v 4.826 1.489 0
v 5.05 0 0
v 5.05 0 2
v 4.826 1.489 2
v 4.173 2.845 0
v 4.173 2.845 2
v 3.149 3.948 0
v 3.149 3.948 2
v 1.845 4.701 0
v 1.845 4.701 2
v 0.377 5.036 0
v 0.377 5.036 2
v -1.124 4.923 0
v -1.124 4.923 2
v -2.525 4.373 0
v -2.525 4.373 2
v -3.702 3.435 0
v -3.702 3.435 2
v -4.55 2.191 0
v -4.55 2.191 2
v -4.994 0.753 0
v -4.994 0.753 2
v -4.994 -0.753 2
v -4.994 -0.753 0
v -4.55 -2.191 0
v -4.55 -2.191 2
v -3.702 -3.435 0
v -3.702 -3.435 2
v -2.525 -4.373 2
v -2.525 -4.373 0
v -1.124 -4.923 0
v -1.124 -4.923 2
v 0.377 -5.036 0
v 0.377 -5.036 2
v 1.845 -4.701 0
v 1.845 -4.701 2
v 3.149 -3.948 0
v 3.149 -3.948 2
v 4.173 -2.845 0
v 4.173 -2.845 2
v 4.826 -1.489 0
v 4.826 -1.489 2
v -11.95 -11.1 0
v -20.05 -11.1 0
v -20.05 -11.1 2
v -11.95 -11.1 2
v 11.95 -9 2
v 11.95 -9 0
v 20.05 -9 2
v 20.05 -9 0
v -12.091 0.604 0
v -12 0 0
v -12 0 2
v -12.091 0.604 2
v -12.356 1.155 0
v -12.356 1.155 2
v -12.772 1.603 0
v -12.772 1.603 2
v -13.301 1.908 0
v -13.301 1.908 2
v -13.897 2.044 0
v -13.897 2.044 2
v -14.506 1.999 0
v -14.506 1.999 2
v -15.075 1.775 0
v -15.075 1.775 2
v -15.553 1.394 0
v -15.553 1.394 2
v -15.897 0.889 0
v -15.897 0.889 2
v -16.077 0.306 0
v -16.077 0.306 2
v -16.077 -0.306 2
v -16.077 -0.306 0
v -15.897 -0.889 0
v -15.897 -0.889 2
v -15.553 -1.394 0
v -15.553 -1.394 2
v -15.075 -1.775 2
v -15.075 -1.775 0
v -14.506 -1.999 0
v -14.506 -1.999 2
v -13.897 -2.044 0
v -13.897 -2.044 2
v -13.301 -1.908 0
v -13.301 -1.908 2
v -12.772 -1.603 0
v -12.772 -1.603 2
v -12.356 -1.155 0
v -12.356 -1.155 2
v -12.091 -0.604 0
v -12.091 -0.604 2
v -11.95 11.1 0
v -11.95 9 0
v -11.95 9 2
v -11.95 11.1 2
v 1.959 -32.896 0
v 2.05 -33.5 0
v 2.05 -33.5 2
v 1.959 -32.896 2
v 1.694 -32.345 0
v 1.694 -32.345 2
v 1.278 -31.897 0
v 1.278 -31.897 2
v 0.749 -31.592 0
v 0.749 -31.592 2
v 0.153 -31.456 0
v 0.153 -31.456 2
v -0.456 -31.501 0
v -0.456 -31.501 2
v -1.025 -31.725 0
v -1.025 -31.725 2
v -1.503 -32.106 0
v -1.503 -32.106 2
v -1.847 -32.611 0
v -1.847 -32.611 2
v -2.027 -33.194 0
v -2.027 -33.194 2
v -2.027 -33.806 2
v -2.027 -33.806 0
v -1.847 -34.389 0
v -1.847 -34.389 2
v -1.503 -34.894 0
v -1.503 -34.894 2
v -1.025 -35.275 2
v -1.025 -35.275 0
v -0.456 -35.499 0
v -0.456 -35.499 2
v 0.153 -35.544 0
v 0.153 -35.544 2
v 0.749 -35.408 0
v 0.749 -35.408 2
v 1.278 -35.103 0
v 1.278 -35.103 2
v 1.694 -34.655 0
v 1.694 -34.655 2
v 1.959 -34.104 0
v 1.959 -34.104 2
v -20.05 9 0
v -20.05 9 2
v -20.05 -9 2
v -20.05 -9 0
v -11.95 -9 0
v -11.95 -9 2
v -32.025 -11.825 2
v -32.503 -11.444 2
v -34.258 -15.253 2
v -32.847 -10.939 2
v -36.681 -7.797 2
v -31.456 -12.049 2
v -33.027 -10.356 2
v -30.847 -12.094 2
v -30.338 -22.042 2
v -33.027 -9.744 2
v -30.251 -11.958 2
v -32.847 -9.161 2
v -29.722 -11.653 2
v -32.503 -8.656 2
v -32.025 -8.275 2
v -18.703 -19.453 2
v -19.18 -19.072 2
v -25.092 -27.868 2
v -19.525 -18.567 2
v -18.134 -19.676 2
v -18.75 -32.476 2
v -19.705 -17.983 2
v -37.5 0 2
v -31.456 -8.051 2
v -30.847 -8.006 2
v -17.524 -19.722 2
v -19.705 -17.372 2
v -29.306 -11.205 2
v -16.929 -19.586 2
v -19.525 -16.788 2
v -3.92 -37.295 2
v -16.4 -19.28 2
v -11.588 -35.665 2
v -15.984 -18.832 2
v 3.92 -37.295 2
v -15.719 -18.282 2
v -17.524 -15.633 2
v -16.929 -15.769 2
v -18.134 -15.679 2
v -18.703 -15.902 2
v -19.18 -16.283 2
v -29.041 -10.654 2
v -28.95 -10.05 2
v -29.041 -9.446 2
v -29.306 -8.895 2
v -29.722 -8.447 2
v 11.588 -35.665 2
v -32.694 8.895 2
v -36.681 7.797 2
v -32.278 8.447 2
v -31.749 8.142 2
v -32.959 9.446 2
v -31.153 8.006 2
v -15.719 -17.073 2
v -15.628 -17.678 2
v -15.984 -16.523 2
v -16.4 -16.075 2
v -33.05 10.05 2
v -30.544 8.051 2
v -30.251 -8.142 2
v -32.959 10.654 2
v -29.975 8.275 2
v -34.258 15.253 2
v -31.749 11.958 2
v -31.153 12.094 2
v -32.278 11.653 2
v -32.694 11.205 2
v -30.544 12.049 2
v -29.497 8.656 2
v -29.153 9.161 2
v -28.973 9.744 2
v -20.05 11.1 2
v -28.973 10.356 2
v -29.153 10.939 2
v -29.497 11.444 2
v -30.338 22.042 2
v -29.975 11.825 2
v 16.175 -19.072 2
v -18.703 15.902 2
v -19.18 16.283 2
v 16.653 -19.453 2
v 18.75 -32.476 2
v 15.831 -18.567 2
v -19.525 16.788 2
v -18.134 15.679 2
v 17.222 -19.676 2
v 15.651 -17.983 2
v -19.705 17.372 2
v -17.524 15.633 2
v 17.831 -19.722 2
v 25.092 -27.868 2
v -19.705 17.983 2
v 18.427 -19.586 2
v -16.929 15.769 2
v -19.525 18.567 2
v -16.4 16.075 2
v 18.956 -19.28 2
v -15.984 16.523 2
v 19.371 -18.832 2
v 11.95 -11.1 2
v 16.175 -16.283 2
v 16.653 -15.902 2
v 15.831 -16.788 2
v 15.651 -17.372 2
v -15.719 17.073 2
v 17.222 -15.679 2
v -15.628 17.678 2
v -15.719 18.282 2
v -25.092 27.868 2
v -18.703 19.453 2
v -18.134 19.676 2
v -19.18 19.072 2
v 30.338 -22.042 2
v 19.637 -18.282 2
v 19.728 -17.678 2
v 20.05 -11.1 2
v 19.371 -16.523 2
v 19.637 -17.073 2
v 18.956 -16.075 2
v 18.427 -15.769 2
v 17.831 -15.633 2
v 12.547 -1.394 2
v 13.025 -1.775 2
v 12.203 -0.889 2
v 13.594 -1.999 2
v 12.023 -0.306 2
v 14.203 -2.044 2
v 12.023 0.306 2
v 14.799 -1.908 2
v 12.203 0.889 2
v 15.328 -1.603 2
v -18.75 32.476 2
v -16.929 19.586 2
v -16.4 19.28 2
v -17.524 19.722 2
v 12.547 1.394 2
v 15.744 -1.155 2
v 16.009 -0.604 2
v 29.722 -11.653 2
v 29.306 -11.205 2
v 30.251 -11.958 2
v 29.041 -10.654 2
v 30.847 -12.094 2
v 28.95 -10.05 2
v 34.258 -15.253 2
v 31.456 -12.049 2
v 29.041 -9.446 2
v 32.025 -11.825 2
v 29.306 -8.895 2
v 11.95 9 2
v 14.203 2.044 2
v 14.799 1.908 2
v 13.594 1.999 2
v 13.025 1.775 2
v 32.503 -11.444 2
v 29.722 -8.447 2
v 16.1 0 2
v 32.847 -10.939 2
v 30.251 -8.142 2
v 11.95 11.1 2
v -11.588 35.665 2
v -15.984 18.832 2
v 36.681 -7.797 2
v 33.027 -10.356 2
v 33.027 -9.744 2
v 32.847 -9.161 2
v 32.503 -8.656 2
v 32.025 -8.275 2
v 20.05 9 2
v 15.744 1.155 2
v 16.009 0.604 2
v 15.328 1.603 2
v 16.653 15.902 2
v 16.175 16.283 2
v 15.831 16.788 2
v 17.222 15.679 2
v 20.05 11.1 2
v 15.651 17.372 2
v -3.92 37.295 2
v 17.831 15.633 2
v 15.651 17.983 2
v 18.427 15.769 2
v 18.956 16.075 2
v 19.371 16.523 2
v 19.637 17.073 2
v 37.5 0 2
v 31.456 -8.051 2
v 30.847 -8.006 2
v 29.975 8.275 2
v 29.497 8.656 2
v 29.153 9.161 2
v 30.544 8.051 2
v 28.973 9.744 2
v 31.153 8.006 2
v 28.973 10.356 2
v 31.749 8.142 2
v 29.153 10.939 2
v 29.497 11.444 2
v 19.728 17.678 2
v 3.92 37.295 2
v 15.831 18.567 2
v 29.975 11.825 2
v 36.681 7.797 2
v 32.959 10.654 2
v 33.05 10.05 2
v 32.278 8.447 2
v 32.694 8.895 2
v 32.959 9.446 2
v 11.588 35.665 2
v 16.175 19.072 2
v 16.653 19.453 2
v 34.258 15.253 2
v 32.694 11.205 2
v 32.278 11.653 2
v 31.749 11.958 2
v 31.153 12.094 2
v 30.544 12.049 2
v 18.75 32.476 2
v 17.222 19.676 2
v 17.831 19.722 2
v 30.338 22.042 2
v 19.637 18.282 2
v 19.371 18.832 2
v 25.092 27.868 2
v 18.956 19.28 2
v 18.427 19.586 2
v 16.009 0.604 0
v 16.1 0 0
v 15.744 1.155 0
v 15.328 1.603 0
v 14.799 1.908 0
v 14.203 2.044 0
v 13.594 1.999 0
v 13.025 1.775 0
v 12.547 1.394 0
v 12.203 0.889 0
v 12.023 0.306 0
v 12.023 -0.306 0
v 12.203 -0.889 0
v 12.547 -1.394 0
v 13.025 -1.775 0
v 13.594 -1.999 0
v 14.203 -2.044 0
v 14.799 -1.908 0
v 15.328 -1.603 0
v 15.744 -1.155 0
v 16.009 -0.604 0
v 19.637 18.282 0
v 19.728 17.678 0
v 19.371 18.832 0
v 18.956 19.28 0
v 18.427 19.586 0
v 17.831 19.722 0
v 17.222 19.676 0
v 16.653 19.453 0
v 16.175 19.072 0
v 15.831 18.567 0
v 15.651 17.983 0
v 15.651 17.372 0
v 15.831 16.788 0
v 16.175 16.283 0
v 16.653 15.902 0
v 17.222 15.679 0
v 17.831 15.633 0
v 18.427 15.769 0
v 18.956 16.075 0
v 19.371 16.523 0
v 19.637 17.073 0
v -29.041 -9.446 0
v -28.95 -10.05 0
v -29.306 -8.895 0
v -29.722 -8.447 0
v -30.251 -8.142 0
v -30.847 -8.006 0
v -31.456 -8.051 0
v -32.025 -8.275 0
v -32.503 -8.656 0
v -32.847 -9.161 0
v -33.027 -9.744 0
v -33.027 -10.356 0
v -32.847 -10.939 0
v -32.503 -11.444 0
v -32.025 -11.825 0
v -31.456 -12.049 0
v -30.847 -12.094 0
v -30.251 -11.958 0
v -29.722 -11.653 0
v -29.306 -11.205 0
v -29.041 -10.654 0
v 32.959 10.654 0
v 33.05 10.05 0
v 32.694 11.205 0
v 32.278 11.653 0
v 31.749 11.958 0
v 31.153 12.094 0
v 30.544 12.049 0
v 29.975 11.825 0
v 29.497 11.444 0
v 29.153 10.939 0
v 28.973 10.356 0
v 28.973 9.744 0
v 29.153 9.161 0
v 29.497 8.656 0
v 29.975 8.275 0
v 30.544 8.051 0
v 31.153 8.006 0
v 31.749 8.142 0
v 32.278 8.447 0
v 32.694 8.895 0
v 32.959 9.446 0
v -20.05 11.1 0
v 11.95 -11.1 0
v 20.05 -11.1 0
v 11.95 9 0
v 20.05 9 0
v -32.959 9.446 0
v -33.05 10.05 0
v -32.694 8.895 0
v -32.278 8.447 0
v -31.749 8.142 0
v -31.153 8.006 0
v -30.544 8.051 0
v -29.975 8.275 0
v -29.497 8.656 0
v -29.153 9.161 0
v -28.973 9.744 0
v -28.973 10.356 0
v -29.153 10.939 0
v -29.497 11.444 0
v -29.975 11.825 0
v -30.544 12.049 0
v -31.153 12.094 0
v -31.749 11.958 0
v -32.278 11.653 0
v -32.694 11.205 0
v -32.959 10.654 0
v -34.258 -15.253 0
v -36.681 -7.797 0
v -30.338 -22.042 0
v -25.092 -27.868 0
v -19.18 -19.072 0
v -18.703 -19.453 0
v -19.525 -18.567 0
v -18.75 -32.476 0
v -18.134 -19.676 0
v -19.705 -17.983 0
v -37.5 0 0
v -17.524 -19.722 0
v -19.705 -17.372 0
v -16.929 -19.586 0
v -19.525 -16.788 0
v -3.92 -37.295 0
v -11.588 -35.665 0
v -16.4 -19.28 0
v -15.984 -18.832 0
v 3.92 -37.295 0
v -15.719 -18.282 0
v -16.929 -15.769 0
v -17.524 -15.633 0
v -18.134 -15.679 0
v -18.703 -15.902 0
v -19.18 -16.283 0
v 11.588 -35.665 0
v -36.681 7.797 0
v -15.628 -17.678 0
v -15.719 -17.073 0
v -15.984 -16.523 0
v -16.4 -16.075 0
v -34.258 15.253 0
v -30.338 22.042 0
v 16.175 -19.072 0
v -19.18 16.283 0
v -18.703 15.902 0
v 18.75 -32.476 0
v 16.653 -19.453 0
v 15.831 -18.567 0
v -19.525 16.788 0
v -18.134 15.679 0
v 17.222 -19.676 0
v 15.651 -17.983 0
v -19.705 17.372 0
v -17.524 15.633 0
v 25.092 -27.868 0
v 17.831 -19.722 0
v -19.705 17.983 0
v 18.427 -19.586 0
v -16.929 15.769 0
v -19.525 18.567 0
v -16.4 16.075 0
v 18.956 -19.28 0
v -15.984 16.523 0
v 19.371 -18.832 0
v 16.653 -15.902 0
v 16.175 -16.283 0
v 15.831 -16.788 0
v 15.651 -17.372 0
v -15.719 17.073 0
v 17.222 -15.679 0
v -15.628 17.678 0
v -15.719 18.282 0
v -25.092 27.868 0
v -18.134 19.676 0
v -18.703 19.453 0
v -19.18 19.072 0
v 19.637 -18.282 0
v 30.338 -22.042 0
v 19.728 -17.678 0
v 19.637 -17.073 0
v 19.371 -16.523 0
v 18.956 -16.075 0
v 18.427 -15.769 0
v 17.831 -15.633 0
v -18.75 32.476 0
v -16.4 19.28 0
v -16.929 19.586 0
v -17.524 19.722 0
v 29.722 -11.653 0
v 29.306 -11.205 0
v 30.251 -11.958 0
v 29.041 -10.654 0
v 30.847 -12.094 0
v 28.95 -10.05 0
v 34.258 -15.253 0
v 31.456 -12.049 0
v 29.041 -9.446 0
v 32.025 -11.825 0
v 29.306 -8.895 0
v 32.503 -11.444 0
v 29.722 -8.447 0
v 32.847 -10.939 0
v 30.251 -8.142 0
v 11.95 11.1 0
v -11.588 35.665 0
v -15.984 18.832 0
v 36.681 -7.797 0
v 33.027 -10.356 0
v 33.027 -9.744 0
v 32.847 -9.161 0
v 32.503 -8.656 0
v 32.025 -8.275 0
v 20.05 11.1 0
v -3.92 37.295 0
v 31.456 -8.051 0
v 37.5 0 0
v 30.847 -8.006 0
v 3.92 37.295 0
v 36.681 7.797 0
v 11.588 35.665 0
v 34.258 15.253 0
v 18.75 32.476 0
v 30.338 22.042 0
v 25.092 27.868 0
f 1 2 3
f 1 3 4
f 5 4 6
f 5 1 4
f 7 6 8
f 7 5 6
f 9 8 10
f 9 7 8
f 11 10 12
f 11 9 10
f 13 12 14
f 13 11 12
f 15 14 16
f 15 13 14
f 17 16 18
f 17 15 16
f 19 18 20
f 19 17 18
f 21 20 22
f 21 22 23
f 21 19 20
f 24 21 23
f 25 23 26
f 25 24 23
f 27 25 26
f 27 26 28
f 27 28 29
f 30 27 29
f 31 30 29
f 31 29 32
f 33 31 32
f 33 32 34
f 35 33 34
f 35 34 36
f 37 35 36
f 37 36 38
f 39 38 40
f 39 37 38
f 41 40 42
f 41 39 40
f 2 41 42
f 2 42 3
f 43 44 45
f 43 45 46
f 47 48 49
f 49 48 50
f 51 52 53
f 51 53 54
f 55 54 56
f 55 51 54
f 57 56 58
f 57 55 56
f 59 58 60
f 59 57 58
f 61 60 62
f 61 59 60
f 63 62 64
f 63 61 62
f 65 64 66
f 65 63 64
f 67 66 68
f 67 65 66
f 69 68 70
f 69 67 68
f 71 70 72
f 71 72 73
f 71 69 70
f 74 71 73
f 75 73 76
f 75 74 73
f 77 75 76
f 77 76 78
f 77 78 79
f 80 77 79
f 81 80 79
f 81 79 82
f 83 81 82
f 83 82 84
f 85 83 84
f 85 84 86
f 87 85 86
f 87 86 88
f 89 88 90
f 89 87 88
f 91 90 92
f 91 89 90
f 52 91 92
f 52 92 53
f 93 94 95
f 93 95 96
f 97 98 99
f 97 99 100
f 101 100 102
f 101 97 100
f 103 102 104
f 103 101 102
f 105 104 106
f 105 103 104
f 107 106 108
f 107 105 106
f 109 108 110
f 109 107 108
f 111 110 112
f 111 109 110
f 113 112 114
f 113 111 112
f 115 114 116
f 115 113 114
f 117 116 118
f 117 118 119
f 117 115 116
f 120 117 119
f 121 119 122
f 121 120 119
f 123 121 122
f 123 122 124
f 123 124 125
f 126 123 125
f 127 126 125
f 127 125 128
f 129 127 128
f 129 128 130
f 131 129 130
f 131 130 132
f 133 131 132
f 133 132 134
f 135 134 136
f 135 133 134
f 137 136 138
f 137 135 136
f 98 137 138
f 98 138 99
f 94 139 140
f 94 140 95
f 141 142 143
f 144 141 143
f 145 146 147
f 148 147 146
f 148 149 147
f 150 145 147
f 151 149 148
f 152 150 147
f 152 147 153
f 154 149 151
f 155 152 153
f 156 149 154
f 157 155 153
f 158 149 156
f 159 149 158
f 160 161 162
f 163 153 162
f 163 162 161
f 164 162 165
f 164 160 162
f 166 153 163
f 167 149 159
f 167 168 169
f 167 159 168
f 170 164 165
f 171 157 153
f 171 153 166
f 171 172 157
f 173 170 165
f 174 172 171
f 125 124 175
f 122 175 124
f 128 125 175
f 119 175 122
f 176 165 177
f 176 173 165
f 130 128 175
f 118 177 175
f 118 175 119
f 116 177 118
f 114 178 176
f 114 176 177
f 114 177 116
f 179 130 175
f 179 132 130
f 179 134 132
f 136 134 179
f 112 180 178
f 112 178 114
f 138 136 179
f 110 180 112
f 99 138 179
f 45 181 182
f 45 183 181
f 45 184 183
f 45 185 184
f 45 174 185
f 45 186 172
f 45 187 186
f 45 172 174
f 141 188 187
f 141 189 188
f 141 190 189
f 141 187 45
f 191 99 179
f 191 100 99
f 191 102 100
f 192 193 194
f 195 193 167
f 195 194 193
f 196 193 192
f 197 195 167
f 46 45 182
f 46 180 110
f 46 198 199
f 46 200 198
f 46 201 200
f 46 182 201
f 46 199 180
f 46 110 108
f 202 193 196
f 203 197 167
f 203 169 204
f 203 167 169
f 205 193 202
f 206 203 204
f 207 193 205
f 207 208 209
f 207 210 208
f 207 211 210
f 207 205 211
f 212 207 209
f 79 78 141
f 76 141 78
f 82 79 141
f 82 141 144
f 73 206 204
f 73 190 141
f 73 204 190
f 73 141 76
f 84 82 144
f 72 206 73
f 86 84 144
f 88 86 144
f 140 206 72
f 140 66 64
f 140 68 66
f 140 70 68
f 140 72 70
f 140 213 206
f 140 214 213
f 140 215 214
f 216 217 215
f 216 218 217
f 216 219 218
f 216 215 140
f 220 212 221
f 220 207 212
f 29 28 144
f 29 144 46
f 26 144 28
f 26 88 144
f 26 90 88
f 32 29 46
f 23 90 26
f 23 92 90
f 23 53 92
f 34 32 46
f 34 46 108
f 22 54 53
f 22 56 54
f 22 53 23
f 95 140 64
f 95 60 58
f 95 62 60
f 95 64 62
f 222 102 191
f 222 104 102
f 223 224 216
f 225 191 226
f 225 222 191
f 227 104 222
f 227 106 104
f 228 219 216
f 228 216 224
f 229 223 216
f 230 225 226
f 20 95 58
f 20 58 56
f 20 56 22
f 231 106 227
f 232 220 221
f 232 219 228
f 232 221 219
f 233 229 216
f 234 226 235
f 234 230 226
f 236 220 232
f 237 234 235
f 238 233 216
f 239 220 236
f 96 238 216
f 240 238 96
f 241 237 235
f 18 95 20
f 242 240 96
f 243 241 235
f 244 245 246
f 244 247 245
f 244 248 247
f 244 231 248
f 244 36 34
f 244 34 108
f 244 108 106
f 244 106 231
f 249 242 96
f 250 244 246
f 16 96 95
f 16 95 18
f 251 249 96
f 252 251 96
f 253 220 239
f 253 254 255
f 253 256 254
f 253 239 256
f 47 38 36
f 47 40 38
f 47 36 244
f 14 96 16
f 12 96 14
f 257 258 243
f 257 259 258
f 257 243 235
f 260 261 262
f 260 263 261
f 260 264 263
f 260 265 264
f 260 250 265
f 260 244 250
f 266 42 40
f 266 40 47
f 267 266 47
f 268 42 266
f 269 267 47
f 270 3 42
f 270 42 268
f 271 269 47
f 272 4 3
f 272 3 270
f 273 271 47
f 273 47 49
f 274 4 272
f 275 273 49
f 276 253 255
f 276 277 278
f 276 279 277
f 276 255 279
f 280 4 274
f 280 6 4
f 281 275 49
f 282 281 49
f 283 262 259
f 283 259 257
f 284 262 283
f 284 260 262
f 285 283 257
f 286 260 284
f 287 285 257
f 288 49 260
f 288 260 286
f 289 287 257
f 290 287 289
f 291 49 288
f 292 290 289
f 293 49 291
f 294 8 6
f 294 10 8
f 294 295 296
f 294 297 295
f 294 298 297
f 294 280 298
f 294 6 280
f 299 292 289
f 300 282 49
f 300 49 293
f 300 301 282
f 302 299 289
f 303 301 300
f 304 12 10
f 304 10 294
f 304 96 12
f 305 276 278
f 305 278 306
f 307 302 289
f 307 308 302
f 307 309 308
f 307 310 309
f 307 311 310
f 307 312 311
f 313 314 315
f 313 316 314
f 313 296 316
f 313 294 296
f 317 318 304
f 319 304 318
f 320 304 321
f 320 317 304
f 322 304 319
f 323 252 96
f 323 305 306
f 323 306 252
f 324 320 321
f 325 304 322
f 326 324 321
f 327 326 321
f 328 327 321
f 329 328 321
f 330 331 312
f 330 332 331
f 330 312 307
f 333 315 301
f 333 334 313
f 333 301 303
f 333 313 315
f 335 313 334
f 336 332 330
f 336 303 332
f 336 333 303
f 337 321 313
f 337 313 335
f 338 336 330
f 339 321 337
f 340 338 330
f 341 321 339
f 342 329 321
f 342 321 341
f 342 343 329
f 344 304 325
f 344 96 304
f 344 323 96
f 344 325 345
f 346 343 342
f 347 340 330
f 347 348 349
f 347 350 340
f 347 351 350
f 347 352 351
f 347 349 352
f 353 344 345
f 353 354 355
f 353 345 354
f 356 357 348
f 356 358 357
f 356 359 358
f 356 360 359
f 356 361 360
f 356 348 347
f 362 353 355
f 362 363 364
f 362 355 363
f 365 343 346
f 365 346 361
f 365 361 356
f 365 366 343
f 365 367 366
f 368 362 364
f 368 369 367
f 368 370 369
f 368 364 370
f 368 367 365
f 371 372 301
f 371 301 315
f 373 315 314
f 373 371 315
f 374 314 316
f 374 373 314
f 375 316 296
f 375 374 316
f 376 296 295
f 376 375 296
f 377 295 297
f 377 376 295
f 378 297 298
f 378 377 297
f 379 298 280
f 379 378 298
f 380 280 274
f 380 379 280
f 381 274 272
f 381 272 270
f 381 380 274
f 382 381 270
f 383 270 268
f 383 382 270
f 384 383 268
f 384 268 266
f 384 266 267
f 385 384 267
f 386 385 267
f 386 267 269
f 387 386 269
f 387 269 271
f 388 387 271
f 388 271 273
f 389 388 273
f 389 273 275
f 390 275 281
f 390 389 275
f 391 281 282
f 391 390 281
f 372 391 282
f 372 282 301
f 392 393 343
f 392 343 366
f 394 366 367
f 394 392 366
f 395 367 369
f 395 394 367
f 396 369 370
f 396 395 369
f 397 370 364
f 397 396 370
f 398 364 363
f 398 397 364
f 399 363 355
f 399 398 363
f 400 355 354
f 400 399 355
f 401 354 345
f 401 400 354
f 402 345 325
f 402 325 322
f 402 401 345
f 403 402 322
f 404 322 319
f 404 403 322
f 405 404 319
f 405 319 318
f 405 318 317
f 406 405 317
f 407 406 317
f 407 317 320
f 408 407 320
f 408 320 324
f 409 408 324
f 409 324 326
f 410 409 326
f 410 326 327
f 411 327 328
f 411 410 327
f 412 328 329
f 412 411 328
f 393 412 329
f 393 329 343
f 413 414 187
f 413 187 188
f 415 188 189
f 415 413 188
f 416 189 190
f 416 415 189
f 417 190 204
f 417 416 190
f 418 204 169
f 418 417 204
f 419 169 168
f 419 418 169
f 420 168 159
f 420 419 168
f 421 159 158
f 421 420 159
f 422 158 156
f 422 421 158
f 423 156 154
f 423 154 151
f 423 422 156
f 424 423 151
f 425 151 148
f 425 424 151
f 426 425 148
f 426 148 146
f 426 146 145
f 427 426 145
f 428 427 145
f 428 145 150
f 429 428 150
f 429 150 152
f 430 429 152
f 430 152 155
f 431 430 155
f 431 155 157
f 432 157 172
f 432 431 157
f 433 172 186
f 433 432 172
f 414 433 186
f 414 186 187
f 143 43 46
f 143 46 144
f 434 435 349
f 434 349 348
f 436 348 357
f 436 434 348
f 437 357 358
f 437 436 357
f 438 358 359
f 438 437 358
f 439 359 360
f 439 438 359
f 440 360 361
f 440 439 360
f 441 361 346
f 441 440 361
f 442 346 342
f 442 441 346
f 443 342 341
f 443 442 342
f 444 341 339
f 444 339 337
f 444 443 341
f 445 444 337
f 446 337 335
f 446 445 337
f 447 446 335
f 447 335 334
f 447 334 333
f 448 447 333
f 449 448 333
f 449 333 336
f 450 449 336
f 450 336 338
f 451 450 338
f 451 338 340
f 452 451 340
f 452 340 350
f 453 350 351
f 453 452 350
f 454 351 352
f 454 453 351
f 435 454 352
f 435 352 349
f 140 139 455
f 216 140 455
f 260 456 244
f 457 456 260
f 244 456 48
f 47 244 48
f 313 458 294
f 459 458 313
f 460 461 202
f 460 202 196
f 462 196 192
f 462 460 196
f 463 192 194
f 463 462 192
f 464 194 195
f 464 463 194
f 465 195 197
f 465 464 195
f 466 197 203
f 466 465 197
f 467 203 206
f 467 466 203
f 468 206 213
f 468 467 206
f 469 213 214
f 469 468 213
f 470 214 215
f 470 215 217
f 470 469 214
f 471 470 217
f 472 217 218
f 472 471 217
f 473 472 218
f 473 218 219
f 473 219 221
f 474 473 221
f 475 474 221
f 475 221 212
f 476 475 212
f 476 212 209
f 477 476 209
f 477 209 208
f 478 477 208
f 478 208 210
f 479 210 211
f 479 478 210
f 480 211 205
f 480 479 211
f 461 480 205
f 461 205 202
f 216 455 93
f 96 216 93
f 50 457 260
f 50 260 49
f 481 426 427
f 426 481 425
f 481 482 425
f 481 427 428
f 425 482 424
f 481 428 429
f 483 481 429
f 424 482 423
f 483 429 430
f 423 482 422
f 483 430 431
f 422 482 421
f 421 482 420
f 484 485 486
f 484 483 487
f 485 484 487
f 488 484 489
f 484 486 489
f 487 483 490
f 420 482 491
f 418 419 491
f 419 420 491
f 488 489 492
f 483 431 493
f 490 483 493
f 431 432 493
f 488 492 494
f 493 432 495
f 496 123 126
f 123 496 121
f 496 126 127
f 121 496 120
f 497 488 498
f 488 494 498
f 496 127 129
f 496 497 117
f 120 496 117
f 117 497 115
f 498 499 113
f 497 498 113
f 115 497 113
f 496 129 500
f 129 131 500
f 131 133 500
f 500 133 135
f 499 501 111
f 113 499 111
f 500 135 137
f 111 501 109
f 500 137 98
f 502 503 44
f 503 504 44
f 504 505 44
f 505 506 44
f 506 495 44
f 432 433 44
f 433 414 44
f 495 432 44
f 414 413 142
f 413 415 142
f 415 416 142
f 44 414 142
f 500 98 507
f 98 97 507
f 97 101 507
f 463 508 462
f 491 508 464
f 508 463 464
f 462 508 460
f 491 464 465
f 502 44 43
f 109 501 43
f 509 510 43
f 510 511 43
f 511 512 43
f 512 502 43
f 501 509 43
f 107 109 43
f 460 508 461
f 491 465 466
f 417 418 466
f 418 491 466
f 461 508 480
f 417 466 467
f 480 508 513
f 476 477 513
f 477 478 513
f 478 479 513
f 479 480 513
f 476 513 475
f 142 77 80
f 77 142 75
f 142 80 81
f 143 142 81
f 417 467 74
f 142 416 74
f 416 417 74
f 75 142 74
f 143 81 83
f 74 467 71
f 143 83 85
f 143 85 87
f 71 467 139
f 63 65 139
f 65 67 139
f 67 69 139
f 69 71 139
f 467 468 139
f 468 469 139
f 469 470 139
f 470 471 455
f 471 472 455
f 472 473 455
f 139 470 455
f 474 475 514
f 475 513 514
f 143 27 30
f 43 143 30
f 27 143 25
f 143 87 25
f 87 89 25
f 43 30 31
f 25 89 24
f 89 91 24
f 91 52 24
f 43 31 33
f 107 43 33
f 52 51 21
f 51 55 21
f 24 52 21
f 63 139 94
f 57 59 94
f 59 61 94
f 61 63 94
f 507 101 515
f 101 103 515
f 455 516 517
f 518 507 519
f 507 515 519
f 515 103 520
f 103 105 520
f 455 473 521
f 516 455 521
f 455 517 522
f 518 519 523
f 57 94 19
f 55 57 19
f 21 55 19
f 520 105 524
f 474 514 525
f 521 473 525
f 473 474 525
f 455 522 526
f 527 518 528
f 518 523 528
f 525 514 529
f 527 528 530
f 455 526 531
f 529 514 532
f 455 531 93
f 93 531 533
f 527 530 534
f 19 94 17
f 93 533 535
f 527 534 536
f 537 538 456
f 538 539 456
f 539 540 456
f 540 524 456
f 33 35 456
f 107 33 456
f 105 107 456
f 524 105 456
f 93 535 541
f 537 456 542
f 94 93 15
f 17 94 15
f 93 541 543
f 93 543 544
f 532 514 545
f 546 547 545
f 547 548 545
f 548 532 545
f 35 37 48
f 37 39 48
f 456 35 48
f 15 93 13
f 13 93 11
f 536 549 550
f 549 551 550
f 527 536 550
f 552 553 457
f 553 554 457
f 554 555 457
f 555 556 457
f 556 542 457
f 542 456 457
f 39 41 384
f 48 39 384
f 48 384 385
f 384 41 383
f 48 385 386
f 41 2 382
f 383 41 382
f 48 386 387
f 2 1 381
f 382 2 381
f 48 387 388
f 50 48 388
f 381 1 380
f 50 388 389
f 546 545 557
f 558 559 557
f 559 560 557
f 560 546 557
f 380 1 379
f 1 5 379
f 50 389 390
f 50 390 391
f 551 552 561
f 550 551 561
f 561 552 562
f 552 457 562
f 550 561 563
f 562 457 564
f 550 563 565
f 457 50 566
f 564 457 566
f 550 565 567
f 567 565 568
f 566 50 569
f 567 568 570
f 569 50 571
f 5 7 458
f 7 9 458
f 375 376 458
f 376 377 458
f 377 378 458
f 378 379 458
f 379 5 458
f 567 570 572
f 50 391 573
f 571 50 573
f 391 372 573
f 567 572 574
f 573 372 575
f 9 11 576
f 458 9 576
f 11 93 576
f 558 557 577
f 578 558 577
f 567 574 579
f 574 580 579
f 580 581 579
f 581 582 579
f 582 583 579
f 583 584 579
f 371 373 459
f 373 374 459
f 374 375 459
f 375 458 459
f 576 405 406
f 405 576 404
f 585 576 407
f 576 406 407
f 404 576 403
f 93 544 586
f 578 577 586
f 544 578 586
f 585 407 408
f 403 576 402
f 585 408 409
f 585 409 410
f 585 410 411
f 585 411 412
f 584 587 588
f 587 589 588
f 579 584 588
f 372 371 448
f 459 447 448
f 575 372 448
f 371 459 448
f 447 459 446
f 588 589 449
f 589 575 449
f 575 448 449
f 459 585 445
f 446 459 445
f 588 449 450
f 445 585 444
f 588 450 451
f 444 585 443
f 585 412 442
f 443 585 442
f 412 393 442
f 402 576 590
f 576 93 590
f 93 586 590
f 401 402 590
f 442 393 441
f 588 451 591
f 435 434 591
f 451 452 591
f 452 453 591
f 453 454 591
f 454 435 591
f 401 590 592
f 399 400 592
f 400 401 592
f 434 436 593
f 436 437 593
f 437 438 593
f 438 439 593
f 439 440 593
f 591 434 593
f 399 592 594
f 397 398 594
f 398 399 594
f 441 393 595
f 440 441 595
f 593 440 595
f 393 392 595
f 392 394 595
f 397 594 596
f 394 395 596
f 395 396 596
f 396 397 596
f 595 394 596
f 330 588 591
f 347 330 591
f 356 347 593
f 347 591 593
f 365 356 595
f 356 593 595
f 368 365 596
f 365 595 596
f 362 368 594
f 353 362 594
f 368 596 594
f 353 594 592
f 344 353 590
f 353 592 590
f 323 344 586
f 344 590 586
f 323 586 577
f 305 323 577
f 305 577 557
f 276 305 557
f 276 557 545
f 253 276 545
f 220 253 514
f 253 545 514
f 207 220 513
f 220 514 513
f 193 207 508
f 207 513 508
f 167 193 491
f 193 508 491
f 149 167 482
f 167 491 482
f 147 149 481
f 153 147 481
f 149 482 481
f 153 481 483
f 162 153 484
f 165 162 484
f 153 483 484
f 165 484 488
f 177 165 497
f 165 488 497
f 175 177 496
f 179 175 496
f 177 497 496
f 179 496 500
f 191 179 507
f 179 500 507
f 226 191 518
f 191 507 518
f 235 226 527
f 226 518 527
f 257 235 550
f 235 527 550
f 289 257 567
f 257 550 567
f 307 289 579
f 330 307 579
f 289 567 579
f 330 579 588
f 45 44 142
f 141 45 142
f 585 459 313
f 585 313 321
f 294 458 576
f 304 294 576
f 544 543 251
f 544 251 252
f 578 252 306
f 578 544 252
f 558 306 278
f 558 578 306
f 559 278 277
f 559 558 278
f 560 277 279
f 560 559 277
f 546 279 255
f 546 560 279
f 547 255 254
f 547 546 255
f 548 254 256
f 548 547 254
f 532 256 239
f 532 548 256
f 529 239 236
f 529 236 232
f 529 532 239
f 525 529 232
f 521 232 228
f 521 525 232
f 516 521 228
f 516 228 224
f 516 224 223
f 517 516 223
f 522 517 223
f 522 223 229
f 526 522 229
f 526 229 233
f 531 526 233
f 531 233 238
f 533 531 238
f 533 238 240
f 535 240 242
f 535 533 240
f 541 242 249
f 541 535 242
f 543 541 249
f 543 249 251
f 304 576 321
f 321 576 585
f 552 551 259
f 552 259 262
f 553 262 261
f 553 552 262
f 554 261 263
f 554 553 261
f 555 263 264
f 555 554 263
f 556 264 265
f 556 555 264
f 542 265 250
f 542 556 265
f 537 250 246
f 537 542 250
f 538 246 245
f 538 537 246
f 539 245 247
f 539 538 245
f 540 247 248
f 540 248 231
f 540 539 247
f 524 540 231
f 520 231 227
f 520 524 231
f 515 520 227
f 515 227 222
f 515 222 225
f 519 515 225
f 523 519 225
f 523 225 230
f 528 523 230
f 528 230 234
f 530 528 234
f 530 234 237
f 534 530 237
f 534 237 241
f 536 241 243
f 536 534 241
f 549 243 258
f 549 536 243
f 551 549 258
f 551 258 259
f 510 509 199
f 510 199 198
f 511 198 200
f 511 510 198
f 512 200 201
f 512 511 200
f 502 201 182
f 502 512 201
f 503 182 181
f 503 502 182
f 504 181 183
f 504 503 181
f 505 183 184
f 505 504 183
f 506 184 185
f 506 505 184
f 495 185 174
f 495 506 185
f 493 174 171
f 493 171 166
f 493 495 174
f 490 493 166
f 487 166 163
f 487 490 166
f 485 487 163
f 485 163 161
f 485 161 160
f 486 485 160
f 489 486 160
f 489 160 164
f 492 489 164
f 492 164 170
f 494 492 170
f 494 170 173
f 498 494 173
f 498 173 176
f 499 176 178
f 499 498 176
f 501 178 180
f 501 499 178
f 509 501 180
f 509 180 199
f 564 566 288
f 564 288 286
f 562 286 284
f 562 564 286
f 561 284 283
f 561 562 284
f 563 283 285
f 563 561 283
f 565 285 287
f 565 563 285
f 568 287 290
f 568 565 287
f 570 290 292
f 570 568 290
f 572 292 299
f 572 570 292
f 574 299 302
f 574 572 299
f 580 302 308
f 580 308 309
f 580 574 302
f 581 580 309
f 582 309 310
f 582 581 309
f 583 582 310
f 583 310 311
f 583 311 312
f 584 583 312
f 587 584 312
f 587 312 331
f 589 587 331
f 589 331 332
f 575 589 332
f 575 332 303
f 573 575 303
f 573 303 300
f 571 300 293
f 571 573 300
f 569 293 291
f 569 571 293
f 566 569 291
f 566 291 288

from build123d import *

# Parameters (mm, degrees)
SKETCH_1_R      = 37.5
SKETCH_1_R_2    = 5.05
SKETCH_1_R_3    = 2.05
SKETCH_1_W      = 8.1
SKETCH_1_H      = 2.1
EXTRUDE_1_DEPTH = 2


with BuildPart() as part:
    # 草图1 → 凸台-拉伸1 (new body)
    with BuildSketch(Plane.XY):
        Circle(SKETCH_1_R)
        Circle(SKETCH_1_R_2, mode=Mode.SUBTRACT)
        with Locations((-17.67766953, -17.67766953)):
            Circle(SKETCH_1_R_3, mode=Mode.SUBTRACT)
        with Locations((-17.67766953, 17.67766953)):
            Circle(SKETCH_1_R_3, mode=Mode.SUBTRACT)
        with Locations((17.67766953, 17.67766953)):
            Circle(SKETCH_1_R_3, mode=Mode.SUBTRACT)
        with Locations((17.67766953, -17.67766953)):
            Circle(SKETCH_1_R_3, mode=Mode.SUBTRACT)
        with Locations((-31, -10.05)):
            Circle(SKETCH_1_R_3, mode=Mode.SUBTRACT)
        with Locations(Location((-31, 10.05, 0), (0, 0, 180))):
            Circle(SKETCH_1_R_3, mode=Mode.SUBTRACT)
        with Locations((31, 10.05)):
            Circle(SKETCH_1_R_3, mode=Mode.SUBTRACT)
        with Locations(Location((31, -10.05, 0), (0, 0, 180))):
            Circle(SKETCH_1_R_3, mode=Mode.SUBTRACT)
        with Locations((14.05, 0)):
            Circle(SKETCH_1_R_3, mode=Mode.SUBTRACT)
        with Locations((-14.05, 0)):
            Circle(SKETCH_1_R_3, mode=Mode.SUBTRACT)
        with Locations((0, -33.5)):
            Circle(SKETCH_1_R_3, mode=Mode.SUBTRACT)
        with Locations((16, -10.05)):
            Rectangle(SKETCH_1_W, SKETCH_1_H, mode=Mode.SUBTRACT)
        with Locations((16, 10.05)):
            Rectangle(SKETCH_1_W, SKETCH_1_H, mode=Mode.SUBTRACT)
        with Locations((-16, 10.05)):
            Rectangle(SKETCH_1_W, SKETCH_1_H, mode=Mode.SUBTRACT)
        with Locations((-16, -10.05)):
            Rectangle(SKETCH_1_W, SKETCH_1_H, mode=Mode.SUBTRACT)
    extrude(amount=EXTRUDE_1_DEPTH)


solid = part.part
